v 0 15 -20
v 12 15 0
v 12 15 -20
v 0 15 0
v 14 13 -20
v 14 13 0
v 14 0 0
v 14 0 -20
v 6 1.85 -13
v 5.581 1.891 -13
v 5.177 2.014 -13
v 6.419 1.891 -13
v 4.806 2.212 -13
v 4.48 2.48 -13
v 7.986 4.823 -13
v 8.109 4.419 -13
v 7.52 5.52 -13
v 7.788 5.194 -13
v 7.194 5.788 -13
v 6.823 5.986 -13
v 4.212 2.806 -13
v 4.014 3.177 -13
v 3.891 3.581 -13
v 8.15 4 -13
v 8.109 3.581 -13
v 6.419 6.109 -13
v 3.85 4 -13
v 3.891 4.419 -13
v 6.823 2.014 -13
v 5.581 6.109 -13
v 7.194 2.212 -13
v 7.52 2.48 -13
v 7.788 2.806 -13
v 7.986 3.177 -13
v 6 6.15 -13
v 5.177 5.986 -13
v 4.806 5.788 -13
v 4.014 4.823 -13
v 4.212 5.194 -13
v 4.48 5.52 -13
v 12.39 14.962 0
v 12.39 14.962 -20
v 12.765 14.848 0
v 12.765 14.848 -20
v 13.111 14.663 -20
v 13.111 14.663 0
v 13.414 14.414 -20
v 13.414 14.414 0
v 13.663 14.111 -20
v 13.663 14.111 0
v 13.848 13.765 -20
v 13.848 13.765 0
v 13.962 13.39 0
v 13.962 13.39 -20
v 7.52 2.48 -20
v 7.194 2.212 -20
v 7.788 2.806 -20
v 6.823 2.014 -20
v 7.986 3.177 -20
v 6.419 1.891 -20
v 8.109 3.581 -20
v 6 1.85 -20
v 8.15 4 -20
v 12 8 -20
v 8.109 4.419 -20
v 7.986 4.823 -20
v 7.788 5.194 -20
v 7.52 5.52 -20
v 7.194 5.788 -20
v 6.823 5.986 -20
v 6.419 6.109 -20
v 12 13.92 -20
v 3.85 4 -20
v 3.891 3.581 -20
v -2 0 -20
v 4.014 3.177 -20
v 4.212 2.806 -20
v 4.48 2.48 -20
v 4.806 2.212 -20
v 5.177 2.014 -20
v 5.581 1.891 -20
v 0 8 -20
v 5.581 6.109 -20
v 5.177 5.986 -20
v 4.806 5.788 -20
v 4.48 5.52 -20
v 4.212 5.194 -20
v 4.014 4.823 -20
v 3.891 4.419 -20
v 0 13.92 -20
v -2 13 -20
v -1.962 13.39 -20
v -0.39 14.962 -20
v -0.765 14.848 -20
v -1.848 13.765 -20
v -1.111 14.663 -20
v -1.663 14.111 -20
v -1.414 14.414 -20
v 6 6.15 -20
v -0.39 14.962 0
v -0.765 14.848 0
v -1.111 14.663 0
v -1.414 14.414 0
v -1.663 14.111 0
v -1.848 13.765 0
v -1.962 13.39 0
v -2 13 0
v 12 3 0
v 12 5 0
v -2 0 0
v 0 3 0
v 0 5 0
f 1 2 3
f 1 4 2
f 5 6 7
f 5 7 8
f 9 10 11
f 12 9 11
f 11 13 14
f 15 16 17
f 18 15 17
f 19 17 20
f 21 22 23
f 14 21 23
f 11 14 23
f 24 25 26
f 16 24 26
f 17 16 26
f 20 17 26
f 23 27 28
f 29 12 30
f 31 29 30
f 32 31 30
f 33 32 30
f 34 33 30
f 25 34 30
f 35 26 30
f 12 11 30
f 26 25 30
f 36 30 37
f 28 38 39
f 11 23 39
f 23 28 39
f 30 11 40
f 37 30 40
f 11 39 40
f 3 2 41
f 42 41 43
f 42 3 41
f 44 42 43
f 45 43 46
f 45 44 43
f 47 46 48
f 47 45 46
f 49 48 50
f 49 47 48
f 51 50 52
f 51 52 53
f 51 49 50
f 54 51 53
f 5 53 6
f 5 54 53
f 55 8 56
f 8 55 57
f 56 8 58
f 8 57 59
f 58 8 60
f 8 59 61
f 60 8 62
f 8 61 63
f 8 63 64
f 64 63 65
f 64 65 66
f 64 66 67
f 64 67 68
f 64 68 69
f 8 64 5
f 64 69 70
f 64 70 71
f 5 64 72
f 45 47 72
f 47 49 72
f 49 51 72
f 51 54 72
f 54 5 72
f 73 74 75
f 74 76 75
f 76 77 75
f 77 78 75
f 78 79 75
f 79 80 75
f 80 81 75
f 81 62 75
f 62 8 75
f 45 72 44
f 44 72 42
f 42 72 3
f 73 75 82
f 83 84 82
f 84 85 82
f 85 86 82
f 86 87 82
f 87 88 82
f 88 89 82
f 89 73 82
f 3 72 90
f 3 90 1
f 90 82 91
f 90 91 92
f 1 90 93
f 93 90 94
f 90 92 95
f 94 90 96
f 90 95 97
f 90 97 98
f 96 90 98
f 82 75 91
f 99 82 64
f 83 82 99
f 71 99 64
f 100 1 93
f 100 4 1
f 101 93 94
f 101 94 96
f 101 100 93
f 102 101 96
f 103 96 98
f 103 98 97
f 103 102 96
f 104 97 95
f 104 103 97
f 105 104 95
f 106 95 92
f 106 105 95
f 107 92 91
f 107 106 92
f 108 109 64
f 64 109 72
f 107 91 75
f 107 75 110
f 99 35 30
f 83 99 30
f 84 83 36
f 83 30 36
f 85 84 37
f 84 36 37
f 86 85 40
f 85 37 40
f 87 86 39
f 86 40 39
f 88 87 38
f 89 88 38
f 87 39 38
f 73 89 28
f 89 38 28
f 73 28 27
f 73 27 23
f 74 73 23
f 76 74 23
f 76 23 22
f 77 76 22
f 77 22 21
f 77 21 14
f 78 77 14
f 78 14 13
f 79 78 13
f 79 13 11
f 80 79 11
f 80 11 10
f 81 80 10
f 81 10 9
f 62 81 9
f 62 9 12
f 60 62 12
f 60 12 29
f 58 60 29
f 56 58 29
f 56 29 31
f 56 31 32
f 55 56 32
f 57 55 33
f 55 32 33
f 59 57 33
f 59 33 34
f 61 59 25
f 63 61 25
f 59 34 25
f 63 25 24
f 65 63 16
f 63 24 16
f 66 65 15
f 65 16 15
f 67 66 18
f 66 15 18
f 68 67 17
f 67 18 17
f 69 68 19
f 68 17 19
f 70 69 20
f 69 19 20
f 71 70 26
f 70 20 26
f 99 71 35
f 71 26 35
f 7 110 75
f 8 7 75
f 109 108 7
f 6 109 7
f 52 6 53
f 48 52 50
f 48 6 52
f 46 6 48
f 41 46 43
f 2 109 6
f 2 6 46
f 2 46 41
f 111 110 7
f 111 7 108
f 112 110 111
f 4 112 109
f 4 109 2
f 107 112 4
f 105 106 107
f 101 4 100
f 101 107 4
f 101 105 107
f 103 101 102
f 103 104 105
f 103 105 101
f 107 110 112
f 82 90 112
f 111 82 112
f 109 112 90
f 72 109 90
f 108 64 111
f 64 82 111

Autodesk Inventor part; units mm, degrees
ref_plane "YZ Plane" through (0, 0, 0) normal (1, 0, 0) x (0, 1, 0)
ref_plane "XZ Plane" through (0, 0, 0) normal (0, 1, 0) x (-1, 0, 0)
ref_plane "XY Plane" through (0, 0, 0) normal (0, 0, 1) x (1, 0, 0)
sketch "Sketch1" plane through (0, 0, 0) normal (1, 0, 0) x (0, 1, 0)
  line L0 (0, 0) -> (0, -20)
  line L1 (0, -20) -> (8, -20)
  line L2 (8, -20) -> (3, 0)
  line L3 (3, 0) -> (0, 0)
  dimension "d0" = 8
  dimension "d1" = 20
  dimension "d11" = 3
extrude "Extrusion1" add sketch "Sketch1" along normal blind 12
sketch "Sketch2" plane through (0, 0, -20) normal (0, 0, -1) x (-1, 0, 0)
  line L0 (0, 0) -> (0, 8) construction
  line L1 (0, 8) -> (-12, 8) construction
  line L2 (-12, 0) -> (-12, 8) construction
  line L3 (0, 0) -> (-12, 0) construction
  line L4 (-12, 8) -> (0, 0) construction
  line L5 (0, 8) -> (-12, 0) construction
  point P0 (0, 0)
  point P1 (-6, 4)
hole "Hole1" at (6, 4, -20) direction (0, 0, 1) diameter 4.3 depth 7
sketch "Sketch3" plane through (0, 0, 0) normal (-1, 0, 0) x (0, 0, 1)
  line L0 (-20, 0) -> (-20, 8) projected
  line L1 (-20, 8) -> (0, 3) projected
  line L2 (0, 3) -> (0, 0) projected
  line L3 (0, 0) -> (-20, 0) projected
  line L4 (-20, 15) -> (0, 15)
  line L5 (0, 15) -> (0, 5)
  line L6 (0, 5) -> (-20, 13.9197)
  line L7 (-20, 13.9197) -> (-20, 15)
  dimension "d12" = 15
  dimension "d13" = 2
  dimension "d14" = 10
extrude "Extrusion2" add sketch "Sketch3" against normal up to surface (12 mm away) contours L4 L5 L6 L7
sketch "Sketch4" plane through (0, 0, 0) normal (-1, 0, 0) x (0, 0, 1)
  line L0 (-20, 15) -> (-20, 13.9197) projected
  line L1 (0, 0) -> (-20, 0) projected
  line L2 (-20, 15) -> (0, 15)
  line L3 (0, 15) -> (0, 0)
  line L4 (0, 0) -> (-20, 0)
  line L5 (-20, 0) -> (-20, 15)
extrude "Extrusion3" add sketch "Sketch4" along normal blind 2
sketch "Sketch5" plane through (12, 0, 0) normal (1, 0, 0) x (0, 0, -1)
  line L0 (0, 0) -> (0, 15) projected
  line L1 (0, 15) -> (20, 15) projected
  line L2 (0, 0) -> (20, 0)
  line L3 (20, 0) -> (20, 15)
  line L4 (20, 15) -> (0, 15)
  line L5 (0, 15) -> (0, 0)
extrude "Extrusion4" add sketch "Sketch5" along normal blind 2
fillet "Fillet1" radius 2 2 edges at (-2, 15, -10) (14, 15, -10)
properties part number "BeltClampNew"
